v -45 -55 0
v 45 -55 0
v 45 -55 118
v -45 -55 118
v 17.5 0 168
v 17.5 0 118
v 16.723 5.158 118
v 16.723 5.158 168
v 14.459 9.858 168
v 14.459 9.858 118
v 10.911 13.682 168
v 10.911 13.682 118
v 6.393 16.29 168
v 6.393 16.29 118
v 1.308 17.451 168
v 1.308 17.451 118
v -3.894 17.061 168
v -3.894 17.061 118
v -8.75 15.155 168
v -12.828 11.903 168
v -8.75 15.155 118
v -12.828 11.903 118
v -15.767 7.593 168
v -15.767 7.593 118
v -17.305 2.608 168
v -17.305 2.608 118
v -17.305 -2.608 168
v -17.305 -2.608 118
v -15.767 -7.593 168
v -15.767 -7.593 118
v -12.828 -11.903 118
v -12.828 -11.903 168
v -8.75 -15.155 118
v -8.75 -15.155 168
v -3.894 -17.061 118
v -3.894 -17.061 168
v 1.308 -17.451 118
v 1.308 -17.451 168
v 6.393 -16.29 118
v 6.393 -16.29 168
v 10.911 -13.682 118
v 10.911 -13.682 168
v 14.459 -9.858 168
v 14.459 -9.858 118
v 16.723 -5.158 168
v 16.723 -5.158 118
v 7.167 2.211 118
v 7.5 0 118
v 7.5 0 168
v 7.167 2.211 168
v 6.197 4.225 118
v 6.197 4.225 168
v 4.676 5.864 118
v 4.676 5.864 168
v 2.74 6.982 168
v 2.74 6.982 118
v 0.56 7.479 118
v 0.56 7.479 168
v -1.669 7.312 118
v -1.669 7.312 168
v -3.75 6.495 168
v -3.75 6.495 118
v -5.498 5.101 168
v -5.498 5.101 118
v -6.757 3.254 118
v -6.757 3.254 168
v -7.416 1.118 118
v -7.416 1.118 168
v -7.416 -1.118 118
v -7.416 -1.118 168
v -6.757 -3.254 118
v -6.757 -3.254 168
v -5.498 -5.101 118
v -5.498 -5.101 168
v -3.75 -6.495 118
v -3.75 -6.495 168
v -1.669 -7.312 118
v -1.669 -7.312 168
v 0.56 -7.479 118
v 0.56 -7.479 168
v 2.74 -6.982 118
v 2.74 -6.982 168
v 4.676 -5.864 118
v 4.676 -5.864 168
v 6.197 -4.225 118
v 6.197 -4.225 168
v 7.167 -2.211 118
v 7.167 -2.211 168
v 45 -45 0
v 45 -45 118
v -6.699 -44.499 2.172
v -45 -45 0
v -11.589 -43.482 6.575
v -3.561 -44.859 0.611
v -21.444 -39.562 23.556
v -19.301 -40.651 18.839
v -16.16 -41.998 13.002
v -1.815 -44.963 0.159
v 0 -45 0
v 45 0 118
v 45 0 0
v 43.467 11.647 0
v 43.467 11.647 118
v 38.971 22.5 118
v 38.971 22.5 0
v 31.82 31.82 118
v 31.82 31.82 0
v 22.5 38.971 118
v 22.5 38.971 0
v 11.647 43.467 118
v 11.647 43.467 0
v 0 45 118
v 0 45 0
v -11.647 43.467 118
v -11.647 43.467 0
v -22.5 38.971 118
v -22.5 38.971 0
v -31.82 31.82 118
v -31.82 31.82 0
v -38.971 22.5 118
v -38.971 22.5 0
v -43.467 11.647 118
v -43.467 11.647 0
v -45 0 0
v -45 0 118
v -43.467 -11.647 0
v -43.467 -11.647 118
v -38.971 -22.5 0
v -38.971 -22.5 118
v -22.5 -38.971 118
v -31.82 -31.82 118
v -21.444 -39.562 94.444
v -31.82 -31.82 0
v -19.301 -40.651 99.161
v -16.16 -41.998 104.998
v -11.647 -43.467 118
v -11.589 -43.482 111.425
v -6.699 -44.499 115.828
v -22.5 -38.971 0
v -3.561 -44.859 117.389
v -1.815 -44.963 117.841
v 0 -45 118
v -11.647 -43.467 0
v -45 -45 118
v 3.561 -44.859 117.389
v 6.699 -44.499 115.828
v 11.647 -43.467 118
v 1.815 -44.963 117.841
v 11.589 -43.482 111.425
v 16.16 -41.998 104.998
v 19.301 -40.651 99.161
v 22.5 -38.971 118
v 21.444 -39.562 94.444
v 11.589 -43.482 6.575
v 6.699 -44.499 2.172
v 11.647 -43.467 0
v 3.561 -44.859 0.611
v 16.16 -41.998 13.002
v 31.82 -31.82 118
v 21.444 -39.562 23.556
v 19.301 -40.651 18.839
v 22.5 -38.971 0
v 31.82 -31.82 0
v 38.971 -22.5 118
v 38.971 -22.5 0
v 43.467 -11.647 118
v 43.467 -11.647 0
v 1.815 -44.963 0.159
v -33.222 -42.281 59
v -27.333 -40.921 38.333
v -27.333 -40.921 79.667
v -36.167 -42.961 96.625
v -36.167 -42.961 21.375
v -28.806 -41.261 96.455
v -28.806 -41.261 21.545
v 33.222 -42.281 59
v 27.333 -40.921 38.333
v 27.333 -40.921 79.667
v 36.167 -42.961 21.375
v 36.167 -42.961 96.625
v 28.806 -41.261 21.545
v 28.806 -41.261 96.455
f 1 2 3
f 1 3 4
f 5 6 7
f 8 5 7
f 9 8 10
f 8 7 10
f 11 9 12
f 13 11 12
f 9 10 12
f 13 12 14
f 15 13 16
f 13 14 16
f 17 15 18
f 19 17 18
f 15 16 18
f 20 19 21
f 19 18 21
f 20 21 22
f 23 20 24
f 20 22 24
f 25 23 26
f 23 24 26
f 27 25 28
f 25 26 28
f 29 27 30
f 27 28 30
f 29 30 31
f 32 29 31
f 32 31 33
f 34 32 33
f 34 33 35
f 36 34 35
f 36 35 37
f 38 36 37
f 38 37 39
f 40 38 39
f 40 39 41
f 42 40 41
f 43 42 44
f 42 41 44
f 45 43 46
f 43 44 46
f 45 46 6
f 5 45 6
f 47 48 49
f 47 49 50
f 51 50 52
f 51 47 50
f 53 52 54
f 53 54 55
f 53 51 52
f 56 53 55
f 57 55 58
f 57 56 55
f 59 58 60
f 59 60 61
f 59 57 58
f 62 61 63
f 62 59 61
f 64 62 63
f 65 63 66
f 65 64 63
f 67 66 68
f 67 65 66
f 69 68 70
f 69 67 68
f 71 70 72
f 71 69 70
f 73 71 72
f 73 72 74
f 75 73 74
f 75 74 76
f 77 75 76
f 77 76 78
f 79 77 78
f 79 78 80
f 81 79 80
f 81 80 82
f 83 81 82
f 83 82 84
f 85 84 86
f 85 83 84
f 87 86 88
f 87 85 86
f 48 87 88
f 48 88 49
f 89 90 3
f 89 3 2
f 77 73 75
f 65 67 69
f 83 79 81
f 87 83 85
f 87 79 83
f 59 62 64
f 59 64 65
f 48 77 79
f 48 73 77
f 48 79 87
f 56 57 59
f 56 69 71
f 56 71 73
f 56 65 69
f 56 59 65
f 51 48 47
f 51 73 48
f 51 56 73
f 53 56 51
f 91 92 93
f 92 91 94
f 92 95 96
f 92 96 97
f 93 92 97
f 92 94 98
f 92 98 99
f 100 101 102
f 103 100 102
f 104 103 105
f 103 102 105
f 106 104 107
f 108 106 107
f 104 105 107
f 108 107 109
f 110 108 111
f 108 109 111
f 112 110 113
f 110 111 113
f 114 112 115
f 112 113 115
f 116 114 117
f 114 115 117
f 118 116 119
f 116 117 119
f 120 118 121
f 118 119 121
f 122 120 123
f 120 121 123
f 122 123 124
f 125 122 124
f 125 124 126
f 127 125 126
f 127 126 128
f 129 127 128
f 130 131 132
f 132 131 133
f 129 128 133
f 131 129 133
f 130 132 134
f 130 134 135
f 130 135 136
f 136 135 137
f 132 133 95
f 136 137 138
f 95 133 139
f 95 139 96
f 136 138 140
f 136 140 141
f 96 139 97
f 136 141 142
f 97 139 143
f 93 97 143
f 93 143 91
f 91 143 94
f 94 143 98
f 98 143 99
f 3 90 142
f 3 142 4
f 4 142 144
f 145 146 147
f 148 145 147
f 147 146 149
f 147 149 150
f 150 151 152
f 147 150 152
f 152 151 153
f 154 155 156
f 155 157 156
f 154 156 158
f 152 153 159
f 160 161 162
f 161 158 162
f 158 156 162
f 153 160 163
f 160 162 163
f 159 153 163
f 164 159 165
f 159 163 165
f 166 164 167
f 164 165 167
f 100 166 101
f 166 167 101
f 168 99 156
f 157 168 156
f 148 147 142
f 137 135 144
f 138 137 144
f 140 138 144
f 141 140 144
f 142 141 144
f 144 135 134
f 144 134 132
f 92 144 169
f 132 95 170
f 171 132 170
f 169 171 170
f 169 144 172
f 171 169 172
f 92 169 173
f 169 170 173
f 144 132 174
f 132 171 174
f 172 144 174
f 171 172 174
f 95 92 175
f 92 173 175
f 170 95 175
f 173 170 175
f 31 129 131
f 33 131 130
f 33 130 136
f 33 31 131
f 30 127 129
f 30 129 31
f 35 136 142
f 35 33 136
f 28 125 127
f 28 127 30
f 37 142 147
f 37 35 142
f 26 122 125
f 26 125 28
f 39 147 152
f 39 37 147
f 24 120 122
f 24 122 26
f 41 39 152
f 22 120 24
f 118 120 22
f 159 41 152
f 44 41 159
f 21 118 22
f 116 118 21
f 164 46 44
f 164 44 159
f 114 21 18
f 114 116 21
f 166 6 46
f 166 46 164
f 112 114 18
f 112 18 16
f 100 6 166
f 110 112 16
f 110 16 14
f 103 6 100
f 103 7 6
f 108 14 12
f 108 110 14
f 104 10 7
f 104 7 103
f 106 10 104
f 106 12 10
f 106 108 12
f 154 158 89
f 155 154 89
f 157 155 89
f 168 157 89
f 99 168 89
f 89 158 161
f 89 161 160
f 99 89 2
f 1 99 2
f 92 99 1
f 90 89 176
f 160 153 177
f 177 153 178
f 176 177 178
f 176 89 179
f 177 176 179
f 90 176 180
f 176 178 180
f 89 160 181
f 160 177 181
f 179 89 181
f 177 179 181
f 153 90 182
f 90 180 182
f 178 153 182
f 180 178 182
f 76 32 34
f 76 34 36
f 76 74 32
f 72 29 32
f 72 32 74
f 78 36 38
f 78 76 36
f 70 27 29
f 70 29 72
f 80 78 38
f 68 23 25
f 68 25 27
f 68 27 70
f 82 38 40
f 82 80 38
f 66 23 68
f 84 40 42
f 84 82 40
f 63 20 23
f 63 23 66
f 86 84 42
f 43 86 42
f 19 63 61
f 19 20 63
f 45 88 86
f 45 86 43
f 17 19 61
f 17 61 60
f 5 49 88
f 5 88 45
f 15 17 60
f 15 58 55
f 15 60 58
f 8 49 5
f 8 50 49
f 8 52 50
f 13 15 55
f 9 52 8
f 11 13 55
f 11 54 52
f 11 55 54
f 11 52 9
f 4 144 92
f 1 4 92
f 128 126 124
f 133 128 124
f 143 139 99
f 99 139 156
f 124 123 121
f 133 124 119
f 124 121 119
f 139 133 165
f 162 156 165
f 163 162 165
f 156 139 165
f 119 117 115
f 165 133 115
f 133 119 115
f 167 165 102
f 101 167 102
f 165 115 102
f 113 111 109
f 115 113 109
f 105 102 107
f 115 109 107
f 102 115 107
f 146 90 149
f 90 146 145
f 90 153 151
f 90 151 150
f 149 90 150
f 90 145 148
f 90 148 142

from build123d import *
from build123d.topology import SkipClean

# Parameters (mm, degrees)
SKETCH1_R                     = 45
BOSS_EXTRUDE1_DEPTH           = 118
SKETCH2_R                     = 17.5
SKETCH2_R_2                   = 7.5
BOSS_EXTRUDE2_DEPTH           = 50
SKETCH3_W                     = 90
SKETCH3_H                     = 118
BOSS_EXTRUDE3_DEPTH           = 10
SKETCH3_2_W                   = 90
SKETCH3_2_H                   = 118
BOSS_EXTRUDE4_DEPTH           = 6
BOSS_EXTRUDE4_TAPER           = 77
BOSS_EXTRUDE4_OTHER_WAY_DEPTH = 6
BOSS_EXTRUDE4_OTHER_WAY_TAPER = 77


with BuildPart() as part:
    # Sketch1 → Boss-Extrude1 (new body)
    with BuildSketch(Plane.XY):
        Circle(SKETCH1_R)
    extrude(amount=BOSS_EXTRUDE1_DEPTH)

    # Sketch2 → Boss-Extrude2 (add)
    with BuildSketch(Plane.XY.offset(118)):
        Circle(SKETCH2_R)
        Circle(SKETCH2_R_2, mode=Mode.SUBTRACT)
    extrude(amount=BOSS_EXTRUDE2_DEPTH)



with BuildPart() as body_2:
    # Sketch3 → Boss-Extrude3 (new body)
    with BuildSketch(Plane(origin=(0, -45, 0), x_dir=(-1, 0, 0), z_dir=(0, -1, 0))):
        with Locations((0, -59)):
            Rectangle(SKETCH3_W, SKETCH3_H)
    extrude(amount=BOSS_EXTRUDE3_DEPTH)


with BuildPart() as part_1:
    add(part.part)

    add(body_2.part)  # Boss-Extrude4 merges body 2
    # Sketch3<2> → Boss-Extrude4 (add)
    with BuildSketch(Plane(origin=(0, -45, 0), x_dir=(-1, 0, 0), z_dir=(0, -1, 0))):
        with Locations((0, -59)):
            Rectangle(SKETCH3_2_W, SKETCH3_2_H)
    extrude(amount=BOSS_EXTRUDE4_DEPTH, taper=BOSS_EXTRUDE4_TAPER)

    # Sketch3<2> → Boss-Extrude4 other way (add)
    with SkipClean():  # the faces are left unmerged after this step: merging them gives an invalid solid
        with BuildSketch(Plane(origin=(0, -45, 0), x_dir=(-1, 0, 0), z_dir=(0, -1, 0))):
            with Locations((0, -59)):
                Rectangle(SKETCH3_2_W, SKETCH3_2_H)
        extrude(amount=-BOSS_EXTRUDE4_OTHER_WAY_DEPTH, taper=BOSS_EXTRUDE4_OTHER_WAY_TAPER)


solid = part_1.part
